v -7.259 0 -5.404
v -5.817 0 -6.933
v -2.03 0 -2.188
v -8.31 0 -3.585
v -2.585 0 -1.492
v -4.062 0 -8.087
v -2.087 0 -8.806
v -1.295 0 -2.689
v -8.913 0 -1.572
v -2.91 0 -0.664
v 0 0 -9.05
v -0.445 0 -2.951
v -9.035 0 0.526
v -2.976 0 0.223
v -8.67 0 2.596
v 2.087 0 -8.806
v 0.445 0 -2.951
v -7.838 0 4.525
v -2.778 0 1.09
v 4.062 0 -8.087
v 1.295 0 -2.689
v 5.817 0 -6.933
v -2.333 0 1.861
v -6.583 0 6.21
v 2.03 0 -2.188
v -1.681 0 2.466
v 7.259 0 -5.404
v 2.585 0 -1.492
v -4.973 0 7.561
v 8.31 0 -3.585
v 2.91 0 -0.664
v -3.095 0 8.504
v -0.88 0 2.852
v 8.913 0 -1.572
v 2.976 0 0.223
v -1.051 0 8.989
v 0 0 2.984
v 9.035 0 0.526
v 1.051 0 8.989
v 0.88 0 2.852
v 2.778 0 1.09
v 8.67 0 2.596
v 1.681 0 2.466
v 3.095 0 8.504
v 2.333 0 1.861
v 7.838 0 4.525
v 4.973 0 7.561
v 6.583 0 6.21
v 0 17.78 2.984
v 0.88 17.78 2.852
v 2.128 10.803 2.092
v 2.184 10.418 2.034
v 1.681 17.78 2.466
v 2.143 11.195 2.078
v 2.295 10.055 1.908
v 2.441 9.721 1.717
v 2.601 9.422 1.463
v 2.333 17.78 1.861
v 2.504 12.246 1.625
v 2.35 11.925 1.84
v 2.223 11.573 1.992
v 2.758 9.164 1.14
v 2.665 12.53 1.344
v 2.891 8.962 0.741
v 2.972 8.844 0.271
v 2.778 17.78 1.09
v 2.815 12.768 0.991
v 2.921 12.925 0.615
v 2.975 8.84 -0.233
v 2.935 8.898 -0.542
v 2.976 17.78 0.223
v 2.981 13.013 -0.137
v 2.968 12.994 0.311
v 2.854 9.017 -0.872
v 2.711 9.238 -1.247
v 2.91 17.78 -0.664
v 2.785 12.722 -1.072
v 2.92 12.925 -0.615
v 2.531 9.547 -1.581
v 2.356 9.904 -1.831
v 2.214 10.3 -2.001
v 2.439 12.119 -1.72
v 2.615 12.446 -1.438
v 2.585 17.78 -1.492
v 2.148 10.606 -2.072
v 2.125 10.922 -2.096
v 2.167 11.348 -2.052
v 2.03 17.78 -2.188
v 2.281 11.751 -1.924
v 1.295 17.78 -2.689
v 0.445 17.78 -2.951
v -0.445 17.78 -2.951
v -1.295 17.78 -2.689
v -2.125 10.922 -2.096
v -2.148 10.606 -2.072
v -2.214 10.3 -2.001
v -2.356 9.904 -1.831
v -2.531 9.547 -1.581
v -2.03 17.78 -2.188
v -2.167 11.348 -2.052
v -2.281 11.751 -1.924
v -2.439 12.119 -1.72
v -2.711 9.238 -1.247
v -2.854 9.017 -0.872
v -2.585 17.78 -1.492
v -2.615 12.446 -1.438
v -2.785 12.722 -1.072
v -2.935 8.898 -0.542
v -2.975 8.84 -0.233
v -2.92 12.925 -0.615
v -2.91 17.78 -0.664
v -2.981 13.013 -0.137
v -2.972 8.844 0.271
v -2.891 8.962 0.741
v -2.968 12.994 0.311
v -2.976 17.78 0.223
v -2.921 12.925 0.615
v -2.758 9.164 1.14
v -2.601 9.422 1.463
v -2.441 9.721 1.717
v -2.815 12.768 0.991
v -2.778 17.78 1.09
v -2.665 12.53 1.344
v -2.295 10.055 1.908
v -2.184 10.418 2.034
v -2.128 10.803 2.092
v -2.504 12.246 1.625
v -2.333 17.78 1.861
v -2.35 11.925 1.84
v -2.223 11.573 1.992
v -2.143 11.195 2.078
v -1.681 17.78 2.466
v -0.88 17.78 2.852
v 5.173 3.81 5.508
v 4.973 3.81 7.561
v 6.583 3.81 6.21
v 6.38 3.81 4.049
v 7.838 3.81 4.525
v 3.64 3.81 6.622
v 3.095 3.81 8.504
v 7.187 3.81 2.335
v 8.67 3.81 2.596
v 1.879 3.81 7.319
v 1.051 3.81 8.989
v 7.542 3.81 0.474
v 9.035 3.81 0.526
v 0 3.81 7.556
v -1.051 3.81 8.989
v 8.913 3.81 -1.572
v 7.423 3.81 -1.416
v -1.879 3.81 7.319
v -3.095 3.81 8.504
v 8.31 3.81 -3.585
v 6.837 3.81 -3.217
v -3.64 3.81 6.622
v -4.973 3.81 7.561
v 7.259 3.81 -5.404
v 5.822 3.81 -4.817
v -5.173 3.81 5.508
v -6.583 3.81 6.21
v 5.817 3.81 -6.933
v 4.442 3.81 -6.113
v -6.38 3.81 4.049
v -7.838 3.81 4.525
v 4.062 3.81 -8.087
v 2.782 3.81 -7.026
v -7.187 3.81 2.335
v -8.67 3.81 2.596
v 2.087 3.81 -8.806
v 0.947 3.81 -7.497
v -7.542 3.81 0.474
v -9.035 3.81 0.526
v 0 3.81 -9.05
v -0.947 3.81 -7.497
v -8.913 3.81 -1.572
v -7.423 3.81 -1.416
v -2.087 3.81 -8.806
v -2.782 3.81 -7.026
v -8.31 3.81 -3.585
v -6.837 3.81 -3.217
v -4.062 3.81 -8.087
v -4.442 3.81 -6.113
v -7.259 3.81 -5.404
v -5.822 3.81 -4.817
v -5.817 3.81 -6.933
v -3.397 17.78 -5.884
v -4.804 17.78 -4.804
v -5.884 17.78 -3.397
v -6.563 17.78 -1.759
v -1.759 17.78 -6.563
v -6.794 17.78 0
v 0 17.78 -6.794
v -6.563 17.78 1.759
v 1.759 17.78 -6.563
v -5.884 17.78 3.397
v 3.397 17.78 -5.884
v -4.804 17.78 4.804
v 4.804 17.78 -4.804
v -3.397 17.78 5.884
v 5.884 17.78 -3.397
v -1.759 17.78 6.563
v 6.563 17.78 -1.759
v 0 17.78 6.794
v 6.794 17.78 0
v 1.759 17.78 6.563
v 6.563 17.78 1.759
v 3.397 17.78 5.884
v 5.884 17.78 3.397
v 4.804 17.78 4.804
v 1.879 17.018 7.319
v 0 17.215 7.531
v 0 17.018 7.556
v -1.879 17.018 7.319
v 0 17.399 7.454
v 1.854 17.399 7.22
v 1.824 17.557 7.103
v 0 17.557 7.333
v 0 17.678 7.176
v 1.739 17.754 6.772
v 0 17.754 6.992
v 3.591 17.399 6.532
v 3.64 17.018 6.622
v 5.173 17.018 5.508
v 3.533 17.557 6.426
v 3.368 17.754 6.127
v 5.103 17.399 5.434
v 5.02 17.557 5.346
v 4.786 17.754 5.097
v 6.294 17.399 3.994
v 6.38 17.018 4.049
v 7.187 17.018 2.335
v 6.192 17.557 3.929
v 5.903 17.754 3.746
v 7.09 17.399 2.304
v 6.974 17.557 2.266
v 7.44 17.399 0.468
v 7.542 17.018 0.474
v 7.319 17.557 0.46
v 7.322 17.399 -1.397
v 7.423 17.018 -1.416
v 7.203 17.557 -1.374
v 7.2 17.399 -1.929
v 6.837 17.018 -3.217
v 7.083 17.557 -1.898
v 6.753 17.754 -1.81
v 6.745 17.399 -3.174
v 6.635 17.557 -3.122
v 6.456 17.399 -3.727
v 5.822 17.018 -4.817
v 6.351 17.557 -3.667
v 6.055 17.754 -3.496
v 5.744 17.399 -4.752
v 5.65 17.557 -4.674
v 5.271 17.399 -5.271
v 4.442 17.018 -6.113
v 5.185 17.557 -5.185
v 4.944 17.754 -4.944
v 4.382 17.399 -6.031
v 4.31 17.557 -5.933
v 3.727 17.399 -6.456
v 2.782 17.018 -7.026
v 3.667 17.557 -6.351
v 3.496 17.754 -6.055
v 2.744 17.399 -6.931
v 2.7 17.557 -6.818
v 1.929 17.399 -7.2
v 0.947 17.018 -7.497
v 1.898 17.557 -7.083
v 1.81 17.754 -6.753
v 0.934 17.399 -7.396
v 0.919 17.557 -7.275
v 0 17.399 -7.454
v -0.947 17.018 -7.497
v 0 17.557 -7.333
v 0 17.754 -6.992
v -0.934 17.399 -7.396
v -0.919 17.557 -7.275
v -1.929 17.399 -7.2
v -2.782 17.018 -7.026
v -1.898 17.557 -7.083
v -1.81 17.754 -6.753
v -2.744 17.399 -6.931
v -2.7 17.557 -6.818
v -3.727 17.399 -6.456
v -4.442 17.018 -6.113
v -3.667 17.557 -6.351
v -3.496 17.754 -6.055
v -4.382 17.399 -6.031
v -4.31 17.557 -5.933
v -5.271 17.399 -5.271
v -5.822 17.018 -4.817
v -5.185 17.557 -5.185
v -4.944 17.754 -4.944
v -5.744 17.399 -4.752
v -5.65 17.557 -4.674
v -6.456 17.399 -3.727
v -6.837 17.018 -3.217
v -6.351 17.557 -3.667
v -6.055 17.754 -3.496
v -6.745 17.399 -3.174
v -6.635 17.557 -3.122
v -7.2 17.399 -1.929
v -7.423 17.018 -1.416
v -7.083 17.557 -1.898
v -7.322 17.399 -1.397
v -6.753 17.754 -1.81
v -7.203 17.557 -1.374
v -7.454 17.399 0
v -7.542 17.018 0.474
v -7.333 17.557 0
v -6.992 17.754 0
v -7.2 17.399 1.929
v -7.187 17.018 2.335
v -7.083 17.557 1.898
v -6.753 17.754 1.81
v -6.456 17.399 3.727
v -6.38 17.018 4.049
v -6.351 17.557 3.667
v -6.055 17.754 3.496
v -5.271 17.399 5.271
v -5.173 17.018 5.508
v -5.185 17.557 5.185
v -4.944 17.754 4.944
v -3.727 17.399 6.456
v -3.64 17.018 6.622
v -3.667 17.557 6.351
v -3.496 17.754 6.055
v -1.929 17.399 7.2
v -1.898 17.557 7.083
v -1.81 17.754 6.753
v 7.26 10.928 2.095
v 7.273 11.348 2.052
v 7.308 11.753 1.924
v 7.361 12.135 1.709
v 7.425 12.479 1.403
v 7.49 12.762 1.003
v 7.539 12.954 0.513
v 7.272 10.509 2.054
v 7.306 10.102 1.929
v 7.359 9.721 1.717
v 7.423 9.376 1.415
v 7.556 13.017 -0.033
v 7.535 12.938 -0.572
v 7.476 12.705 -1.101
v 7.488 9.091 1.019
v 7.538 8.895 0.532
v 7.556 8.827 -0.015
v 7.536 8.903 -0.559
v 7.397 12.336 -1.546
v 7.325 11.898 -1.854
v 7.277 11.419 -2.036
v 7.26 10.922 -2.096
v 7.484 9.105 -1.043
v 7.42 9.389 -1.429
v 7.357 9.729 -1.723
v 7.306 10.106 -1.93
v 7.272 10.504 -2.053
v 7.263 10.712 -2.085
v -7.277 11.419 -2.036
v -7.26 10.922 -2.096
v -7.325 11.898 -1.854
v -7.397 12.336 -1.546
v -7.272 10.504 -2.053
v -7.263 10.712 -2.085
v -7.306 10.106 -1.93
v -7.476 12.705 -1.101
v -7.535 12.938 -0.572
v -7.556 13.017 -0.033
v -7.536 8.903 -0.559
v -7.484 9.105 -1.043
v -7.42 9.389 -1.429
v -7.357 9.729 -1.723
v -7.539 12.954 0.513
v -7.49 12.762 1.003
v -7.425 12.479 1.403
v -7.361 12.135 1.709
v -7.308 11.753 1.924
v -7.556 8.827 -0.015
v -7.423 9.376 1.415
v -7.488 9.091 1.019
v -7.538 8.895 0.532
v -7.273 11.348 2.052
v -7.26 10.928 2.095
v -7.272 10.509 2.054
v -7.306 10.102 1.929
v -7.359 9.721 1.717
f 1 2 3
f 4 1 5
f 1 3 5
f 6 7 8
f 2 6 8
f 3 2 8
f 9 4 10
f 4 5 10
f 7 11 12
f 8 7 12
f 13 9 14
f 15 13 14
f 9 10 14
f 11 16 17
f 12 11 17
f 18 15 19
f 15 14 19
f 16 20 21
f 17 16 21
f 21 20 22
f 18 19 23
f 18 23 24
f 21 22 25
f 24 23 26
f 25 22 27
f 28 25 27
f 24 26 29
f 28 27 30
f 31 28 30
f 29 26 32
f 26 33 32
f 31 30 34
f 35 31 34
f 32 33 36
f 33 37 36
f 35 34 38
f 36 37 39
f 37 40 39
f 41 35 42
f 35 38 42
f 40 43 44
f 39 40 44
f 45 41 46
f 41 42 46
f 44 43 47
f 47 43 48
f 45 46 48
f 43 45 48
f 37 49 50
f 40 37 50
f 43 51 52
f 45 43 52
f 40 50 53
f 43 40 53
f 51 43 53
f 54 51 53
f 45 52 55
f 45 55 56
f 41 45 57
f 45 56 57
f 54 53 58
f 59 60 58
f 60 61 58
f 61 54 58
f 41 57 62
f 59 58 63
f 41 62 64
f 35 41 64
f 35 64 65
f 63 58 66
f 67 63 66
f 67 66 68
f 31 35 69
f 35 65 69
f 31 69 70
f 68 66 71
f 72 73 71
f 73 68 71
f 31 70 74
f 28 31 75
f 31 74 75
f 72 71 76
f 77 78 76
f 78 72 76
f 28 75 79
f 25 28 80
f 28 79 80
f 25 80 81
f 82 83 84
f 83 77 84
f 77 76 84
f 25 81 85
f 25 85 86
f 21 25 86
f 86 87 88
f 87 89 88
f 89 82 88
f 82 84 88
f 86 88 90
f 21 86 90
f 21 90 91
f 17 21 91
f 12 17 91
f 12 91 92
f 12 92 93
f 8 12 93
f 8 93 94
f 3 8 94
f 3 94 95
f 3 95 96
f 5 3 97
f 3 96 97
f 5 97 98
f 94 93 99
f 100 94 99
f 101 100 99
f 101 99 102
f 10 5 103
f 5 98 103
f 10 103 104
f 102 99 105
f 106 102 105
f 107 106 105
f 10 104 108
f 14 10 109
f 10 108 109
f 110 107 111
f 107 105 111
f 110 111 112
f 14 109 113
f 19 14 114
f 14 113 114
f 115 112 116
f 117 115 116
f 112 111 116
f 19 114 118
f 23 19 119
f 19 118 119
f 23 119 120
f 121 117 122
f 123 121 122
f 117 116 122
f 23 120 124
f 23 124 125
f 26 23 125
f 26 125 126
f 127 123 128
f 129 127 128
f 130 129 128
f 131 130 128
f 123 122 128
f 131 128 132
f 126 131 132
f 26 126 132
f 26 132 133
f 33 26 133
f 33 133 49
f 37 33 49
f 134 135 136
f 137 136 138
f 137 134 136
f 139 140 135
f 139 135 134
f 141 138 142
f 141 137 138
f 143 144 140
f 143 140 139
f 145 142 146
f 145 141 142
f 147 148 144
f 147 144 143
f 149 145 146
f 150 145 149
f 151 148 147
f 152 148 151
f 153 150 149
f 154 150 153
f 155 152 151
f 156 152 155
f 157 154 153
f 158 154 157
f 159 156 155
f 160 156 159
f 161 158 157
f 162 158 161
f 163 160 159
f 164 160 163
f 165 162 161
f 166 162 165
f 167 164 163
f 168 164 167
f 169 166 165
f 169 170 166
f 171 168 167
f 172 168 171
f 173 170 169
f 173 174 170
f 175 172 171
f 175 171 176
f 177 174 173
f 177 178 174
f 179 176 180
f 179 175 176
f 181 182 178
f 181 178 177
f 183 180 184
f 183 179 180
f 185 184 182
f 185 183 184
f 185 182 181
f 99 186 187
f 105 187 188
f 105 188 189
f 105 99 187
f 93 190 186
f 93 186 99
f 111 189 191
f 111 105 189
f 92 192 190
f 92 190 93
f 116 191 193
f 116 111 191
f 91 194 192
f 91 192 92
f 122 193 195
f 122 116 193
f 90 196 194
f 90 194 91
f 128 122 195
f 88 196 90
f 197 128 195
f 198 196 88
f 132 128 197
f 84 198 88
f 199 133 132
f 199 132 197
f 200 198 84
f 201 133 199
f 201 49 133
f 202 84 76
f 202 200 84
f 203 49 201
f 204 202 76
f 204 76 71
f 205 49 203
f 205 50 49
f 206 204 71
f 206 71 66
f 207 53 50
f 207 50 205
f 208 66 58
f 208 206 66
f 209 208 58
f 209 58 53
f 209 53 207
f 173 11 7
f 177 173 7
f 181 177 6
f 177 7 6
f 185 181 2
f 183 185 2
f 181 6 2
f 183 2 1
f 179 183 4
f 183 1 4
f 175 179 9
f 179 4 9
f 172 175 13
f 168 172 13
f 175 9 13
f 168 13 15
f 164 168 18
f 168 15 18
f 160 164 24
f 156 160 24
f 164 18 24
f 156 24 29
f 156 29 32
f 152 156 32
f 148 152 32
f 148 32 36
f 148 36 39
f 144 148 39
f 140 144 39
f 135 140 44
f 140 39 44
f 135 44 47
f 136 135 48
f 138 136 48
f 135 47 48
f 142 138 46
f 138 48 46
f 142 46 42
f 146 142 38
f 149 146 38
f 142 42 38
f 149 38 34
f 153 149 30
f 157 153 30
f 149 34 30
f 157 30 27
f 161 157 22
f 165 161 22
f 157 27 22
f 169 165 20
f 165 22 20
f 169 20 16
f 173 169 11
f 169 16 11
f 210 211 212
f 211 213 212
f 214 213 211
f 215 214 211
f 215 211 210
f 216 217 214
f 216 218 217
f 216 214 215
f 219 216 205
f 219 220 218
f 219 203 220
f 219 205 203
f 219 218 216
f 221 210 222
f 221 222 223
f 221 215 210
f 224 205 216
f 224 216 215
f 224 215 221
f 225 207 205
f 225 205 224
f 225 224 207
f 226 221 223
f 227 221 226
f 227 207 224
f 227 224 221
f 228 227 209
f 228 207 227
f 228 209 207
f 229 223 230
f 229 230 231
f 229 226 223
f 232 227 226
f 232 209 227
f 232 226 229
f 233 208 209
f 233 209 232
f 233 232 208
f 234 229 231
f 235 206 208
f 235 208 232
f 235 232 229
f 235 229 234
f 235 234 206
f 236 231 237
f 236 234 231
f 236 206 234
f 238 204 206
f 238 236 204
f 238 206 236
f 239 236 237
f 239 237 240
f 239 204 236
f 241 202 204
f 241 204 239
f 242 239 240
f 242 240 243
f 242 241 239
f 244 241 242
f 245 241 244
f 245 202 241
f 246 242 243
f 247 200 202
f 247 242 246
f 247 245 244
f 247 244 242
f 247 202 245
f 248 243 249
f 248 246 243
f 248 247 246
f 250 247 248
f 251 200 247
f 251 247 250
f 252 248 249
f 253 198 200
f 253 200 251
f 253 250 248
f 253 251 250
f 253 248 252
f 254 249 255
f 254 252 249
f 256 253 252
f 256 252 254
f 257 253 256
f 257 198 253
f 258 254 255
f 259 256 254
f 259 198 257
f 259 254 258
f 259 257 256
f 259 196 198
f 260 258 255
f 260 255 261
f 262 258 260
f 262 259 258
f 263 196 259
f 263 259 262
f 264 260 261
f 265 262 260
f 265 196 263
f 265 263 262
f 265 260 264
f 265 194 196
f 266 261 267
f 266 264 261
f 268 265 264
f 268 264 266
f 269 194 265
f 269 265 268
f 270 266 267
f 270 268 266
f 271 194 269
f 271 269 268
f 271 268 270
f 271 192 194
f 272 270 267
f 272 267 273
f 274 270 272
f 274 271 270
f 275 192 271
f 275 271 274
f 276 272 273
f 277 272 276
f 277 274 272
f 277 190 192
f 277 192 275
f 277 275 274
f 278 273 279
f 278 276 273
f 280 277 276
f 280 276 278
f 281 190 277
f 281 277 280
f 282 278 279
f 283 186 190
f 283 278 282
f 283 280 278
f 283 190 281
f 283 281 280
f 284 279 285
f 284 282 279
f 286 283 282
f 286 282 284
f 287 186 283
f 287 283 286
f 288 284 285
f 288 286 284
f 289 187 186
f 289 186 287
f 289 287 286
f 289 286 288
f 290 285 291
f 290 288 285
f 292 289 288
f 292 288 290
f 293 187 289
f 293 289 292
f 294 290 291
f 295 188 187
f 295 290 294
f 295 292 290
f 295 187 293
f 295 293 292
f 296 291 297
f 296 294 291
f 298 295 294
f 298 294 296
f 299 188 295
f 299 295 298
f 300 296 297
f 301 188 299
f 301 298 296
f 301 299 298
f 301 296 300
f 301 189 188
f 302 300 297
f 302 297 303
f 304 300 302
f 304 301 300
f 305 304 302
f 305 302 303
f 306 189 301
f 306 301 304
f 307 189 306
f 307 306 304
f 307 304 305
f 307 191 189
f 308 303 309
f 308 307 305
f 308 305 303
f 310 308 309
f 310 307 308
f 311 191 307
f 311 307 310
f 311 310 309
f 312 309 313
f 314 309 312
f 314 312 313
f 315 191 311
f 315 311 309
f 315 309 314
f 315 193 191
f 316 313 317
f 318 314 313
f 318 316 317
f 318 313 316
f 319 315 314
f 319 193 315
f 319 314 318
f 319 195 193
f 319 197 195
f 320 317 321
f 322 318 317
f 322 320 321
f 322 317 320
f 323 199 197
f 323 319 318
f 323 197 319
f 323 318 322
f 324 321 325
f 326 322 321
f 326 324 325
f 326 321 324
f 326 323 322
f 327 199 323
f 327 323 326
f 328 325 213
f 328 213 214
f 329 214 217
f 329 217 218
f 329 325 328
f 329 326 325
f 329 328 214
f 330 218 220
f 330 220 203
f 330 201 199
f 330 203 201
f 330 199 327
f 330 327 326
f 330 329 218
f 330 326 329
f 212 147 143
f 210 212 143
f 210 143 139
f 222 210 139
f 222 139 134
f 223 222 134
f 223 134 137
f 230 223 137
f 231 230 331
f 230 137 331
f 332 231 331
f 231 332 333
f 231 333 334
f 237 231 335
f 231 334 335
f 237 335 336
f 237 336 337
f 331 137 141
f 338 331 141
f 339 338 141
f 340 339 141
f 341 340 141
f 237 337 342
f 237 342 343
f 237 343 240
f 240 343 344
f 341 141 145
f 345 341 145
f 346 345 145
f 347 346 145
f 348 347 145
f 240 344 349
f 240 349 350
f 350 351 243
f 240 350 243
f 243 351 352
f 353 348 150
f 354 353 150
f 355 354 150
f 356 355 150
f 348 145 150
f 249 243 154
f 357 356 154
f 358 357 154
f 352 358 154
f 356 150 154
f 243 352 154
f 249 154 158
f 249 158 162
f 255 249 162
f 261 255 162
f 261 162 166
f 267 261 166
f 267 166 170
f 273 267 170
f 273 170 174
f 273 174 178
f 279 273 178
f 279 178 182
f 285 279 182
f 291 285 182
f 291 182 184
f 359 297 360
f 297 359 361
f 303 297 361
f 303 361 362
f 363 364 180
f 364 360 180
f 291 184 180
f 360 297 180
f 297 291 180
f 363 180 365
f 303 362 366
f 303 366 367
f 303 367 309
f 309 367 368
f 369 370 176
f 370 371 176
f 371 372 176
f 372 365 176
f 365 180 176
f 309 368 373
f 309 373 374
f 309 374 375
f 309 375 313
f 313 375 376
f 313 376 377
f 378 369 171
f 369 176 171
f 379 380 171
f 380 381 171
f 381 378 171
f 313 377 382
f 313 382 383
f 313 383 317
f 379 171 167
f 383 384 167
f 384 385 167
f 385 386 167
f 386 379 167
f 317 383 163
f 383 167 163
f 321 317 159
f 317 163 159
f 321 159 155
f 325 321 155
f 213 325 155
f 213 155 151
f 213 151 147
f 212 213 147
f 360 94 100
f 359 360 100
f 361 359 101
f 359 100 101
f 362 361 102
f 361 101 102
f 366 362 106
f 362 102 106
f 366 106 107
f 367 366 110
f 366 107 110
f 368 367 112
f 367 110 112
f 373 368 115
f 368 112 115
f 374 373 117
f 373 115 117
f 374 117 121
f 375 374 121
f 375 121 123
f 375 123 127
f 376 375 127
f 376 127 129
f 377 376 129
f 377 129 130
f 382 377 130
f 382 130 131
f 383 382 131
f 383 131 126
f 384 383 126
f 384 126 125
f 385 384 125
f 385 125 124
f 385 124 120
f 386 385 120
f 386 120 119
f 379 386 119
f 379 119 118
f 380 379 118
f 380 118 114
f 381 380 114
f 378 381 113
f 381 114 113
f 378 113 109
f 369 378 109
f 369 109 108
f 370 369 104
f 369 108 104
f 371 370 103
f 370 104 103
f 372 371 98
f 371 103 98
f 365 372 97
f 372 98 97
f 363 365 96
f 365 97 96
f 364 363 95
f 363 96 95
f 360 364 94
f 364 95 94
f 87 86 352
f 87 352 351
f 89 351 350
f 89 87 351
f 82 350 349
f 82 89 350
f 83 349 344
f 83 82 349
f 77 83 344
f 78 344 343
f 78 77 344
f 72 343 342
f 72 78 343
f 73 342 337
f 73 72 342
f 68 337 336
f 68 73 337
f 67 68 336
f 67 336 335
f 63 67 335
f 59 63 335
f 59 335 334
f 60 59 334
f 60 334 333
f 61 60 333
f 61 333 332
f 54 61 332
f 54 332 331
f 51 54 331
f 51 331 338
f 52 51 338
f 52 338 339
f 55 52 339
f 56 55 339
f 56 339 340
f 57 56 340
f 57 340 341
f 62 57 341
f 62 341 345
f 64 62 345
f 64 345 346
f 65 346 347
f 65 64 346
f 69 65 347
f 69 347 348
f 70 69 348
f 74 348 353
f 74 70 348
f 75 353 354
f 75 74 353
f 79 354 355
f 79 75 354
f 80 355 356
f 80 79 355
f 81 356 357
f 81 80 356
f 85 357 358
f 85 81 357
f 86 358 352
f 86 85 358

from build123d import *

# Parameters (mm, degrees)
SKETCH1_R                           = 9.05
PLATE_DEPTH                         = 3.81
SKETCH1_3_R                         = 7.5565
PLUG_DEPTH                          = 17.78
CUT_EXTRUDE1_REACH                  = 23.907
CUT_EXTRUDE1_END_RADIUS             = 7.5565
SKETCH4_R                           = 2.0955
CUT_EXTRUDE1_DIRECTION_2_REACH      = 23.907
CUT_EXTRUDE1_DIRECTION_2_END_RADIUS = 7.5565
FILLET1_R                           = 0.762
CUT_EXTRUDE2_REACH                  = 23.907
SKETCH5_R                           = 2.9845


with BuildPart() as part:
    # Sketch1 → Plate (new body)
    with BuildSketch(Plane(origin=(0, 0, 0), x_dir=(1, 0, 0), z_dir=(0, 1, 0))):
        Circle(SKETCH1_R)
    extrude(amount=PLATE_DEPTH)

    # Sketch1<3> → Plug (add)
    with BuildSketch(Plane(origin=(0, 0, 0), x_dir=(1, 0, 0), z_dir=(0, 1, 0))):
        Circle(SKETCH1_3_R)
    extrude(amount=PLUG_DEPTH)

    # Cut-Extrude1: up to this cylinder (the profile starts inside it)
    cut_extrude1_end = Plane(origin=(0, 10.922, 0), z_dir=(0, -1, 0)) * Cylinder(CUT_EXTRUDE1_END_RADIUS, 63.927, mode=Mode.PRIVATE)
    # Sketch4 → Cut-Extrude1 (cut, up to the surface)
    with BuildSketch(Plane(origin=(0, 0, 0), x_dir=(0, 0, -1), z_dir=(1, 0, 0)), mode=Mode.PRIVATE) as cut_extrude1_sk1:
        with Locations((0, 10.922)):
            Circle(SKETCH4_R)
    cut_extrude1_tool1 = extrude(cut_extrude1_sk1.sketch, amount=-CUT_EXTRUDE1_REACH, mode=Mode.PRIVATE) & cut_extrude1_end
    add(cut_extrude1_tool1.solids().sort_by_distance((0, 10.922, 0))[0], mode=Mode.SUBTRACT)

    # Cut-Extrude1 direction 2: up to this cylinder (the profile starts inside it)
    cut_extrude1_direction_2_end = Plane(origin=(0, 10.922, 0), z_dir=(0, -1, 0)) * Cylinder(CUT_EXTRUDE1_DIRECTION_2_END_RADIUS, 63.927, mode=Mode.PRIVATE)
    # Sketch4 → Cut-Extrude1 direction 2 (cut, up to the surface)
    with BuildSketch(Plane(origin=(0, 0, 0), x_dir=(0, 0, -1), z_dir=(1, 0, 0)), mode=Mode.PRIVATE) as cut_extrude1_direction_2_sk1:
        with Locations((0, 10.922)):
            Circle(SKETCH4_R)
    cut_extrude1_direction_2_tool1 = extrude(cut_extrude1_direction_2_sk1.sketch, amount=CUT_EXTRUDE1_DIRECTION_2_REACH, mode=Mode.PRIVATE) & cut_extrude1_direction_2_end
    add(cut_extrude1_direction_2_tool1.solids().sort_by_distance((0, 10.922, 0))[0], mode=Mode.SUBTRACT)

    # Fillet1
    fillet1_edges = [part.edges().sort_by_distance(p)[0] for p in [
        (-7.5565, 17.78, 0),
    ]]
    fillet(fillet1_edges, radius=FILLET1_R)

    # Sketch5 → Cut-Extrude2 (cut, up to next)
    with BuildSketch(Plane(origin=(0, 17.78, 0), x_dir=(1, 0, 0), z_dir=(0, 1, 0)), mode=Mode.PRIVATE) as cut_extrude2_sk1:
        Circle(SKETCH5_R)
    cut_extrude2_tool1 = extrude(cut_extrude2_sk1.sketch, amount=-CUT_EXTRUDE2_REACH, mode=Mode.PRIVATE) & part.part
    add(cut_extrude2_tool1.solids().sort_by_distance((0, 17.78, 0))[0], mode=Mode.SUBTRACT)


solid = part.part
